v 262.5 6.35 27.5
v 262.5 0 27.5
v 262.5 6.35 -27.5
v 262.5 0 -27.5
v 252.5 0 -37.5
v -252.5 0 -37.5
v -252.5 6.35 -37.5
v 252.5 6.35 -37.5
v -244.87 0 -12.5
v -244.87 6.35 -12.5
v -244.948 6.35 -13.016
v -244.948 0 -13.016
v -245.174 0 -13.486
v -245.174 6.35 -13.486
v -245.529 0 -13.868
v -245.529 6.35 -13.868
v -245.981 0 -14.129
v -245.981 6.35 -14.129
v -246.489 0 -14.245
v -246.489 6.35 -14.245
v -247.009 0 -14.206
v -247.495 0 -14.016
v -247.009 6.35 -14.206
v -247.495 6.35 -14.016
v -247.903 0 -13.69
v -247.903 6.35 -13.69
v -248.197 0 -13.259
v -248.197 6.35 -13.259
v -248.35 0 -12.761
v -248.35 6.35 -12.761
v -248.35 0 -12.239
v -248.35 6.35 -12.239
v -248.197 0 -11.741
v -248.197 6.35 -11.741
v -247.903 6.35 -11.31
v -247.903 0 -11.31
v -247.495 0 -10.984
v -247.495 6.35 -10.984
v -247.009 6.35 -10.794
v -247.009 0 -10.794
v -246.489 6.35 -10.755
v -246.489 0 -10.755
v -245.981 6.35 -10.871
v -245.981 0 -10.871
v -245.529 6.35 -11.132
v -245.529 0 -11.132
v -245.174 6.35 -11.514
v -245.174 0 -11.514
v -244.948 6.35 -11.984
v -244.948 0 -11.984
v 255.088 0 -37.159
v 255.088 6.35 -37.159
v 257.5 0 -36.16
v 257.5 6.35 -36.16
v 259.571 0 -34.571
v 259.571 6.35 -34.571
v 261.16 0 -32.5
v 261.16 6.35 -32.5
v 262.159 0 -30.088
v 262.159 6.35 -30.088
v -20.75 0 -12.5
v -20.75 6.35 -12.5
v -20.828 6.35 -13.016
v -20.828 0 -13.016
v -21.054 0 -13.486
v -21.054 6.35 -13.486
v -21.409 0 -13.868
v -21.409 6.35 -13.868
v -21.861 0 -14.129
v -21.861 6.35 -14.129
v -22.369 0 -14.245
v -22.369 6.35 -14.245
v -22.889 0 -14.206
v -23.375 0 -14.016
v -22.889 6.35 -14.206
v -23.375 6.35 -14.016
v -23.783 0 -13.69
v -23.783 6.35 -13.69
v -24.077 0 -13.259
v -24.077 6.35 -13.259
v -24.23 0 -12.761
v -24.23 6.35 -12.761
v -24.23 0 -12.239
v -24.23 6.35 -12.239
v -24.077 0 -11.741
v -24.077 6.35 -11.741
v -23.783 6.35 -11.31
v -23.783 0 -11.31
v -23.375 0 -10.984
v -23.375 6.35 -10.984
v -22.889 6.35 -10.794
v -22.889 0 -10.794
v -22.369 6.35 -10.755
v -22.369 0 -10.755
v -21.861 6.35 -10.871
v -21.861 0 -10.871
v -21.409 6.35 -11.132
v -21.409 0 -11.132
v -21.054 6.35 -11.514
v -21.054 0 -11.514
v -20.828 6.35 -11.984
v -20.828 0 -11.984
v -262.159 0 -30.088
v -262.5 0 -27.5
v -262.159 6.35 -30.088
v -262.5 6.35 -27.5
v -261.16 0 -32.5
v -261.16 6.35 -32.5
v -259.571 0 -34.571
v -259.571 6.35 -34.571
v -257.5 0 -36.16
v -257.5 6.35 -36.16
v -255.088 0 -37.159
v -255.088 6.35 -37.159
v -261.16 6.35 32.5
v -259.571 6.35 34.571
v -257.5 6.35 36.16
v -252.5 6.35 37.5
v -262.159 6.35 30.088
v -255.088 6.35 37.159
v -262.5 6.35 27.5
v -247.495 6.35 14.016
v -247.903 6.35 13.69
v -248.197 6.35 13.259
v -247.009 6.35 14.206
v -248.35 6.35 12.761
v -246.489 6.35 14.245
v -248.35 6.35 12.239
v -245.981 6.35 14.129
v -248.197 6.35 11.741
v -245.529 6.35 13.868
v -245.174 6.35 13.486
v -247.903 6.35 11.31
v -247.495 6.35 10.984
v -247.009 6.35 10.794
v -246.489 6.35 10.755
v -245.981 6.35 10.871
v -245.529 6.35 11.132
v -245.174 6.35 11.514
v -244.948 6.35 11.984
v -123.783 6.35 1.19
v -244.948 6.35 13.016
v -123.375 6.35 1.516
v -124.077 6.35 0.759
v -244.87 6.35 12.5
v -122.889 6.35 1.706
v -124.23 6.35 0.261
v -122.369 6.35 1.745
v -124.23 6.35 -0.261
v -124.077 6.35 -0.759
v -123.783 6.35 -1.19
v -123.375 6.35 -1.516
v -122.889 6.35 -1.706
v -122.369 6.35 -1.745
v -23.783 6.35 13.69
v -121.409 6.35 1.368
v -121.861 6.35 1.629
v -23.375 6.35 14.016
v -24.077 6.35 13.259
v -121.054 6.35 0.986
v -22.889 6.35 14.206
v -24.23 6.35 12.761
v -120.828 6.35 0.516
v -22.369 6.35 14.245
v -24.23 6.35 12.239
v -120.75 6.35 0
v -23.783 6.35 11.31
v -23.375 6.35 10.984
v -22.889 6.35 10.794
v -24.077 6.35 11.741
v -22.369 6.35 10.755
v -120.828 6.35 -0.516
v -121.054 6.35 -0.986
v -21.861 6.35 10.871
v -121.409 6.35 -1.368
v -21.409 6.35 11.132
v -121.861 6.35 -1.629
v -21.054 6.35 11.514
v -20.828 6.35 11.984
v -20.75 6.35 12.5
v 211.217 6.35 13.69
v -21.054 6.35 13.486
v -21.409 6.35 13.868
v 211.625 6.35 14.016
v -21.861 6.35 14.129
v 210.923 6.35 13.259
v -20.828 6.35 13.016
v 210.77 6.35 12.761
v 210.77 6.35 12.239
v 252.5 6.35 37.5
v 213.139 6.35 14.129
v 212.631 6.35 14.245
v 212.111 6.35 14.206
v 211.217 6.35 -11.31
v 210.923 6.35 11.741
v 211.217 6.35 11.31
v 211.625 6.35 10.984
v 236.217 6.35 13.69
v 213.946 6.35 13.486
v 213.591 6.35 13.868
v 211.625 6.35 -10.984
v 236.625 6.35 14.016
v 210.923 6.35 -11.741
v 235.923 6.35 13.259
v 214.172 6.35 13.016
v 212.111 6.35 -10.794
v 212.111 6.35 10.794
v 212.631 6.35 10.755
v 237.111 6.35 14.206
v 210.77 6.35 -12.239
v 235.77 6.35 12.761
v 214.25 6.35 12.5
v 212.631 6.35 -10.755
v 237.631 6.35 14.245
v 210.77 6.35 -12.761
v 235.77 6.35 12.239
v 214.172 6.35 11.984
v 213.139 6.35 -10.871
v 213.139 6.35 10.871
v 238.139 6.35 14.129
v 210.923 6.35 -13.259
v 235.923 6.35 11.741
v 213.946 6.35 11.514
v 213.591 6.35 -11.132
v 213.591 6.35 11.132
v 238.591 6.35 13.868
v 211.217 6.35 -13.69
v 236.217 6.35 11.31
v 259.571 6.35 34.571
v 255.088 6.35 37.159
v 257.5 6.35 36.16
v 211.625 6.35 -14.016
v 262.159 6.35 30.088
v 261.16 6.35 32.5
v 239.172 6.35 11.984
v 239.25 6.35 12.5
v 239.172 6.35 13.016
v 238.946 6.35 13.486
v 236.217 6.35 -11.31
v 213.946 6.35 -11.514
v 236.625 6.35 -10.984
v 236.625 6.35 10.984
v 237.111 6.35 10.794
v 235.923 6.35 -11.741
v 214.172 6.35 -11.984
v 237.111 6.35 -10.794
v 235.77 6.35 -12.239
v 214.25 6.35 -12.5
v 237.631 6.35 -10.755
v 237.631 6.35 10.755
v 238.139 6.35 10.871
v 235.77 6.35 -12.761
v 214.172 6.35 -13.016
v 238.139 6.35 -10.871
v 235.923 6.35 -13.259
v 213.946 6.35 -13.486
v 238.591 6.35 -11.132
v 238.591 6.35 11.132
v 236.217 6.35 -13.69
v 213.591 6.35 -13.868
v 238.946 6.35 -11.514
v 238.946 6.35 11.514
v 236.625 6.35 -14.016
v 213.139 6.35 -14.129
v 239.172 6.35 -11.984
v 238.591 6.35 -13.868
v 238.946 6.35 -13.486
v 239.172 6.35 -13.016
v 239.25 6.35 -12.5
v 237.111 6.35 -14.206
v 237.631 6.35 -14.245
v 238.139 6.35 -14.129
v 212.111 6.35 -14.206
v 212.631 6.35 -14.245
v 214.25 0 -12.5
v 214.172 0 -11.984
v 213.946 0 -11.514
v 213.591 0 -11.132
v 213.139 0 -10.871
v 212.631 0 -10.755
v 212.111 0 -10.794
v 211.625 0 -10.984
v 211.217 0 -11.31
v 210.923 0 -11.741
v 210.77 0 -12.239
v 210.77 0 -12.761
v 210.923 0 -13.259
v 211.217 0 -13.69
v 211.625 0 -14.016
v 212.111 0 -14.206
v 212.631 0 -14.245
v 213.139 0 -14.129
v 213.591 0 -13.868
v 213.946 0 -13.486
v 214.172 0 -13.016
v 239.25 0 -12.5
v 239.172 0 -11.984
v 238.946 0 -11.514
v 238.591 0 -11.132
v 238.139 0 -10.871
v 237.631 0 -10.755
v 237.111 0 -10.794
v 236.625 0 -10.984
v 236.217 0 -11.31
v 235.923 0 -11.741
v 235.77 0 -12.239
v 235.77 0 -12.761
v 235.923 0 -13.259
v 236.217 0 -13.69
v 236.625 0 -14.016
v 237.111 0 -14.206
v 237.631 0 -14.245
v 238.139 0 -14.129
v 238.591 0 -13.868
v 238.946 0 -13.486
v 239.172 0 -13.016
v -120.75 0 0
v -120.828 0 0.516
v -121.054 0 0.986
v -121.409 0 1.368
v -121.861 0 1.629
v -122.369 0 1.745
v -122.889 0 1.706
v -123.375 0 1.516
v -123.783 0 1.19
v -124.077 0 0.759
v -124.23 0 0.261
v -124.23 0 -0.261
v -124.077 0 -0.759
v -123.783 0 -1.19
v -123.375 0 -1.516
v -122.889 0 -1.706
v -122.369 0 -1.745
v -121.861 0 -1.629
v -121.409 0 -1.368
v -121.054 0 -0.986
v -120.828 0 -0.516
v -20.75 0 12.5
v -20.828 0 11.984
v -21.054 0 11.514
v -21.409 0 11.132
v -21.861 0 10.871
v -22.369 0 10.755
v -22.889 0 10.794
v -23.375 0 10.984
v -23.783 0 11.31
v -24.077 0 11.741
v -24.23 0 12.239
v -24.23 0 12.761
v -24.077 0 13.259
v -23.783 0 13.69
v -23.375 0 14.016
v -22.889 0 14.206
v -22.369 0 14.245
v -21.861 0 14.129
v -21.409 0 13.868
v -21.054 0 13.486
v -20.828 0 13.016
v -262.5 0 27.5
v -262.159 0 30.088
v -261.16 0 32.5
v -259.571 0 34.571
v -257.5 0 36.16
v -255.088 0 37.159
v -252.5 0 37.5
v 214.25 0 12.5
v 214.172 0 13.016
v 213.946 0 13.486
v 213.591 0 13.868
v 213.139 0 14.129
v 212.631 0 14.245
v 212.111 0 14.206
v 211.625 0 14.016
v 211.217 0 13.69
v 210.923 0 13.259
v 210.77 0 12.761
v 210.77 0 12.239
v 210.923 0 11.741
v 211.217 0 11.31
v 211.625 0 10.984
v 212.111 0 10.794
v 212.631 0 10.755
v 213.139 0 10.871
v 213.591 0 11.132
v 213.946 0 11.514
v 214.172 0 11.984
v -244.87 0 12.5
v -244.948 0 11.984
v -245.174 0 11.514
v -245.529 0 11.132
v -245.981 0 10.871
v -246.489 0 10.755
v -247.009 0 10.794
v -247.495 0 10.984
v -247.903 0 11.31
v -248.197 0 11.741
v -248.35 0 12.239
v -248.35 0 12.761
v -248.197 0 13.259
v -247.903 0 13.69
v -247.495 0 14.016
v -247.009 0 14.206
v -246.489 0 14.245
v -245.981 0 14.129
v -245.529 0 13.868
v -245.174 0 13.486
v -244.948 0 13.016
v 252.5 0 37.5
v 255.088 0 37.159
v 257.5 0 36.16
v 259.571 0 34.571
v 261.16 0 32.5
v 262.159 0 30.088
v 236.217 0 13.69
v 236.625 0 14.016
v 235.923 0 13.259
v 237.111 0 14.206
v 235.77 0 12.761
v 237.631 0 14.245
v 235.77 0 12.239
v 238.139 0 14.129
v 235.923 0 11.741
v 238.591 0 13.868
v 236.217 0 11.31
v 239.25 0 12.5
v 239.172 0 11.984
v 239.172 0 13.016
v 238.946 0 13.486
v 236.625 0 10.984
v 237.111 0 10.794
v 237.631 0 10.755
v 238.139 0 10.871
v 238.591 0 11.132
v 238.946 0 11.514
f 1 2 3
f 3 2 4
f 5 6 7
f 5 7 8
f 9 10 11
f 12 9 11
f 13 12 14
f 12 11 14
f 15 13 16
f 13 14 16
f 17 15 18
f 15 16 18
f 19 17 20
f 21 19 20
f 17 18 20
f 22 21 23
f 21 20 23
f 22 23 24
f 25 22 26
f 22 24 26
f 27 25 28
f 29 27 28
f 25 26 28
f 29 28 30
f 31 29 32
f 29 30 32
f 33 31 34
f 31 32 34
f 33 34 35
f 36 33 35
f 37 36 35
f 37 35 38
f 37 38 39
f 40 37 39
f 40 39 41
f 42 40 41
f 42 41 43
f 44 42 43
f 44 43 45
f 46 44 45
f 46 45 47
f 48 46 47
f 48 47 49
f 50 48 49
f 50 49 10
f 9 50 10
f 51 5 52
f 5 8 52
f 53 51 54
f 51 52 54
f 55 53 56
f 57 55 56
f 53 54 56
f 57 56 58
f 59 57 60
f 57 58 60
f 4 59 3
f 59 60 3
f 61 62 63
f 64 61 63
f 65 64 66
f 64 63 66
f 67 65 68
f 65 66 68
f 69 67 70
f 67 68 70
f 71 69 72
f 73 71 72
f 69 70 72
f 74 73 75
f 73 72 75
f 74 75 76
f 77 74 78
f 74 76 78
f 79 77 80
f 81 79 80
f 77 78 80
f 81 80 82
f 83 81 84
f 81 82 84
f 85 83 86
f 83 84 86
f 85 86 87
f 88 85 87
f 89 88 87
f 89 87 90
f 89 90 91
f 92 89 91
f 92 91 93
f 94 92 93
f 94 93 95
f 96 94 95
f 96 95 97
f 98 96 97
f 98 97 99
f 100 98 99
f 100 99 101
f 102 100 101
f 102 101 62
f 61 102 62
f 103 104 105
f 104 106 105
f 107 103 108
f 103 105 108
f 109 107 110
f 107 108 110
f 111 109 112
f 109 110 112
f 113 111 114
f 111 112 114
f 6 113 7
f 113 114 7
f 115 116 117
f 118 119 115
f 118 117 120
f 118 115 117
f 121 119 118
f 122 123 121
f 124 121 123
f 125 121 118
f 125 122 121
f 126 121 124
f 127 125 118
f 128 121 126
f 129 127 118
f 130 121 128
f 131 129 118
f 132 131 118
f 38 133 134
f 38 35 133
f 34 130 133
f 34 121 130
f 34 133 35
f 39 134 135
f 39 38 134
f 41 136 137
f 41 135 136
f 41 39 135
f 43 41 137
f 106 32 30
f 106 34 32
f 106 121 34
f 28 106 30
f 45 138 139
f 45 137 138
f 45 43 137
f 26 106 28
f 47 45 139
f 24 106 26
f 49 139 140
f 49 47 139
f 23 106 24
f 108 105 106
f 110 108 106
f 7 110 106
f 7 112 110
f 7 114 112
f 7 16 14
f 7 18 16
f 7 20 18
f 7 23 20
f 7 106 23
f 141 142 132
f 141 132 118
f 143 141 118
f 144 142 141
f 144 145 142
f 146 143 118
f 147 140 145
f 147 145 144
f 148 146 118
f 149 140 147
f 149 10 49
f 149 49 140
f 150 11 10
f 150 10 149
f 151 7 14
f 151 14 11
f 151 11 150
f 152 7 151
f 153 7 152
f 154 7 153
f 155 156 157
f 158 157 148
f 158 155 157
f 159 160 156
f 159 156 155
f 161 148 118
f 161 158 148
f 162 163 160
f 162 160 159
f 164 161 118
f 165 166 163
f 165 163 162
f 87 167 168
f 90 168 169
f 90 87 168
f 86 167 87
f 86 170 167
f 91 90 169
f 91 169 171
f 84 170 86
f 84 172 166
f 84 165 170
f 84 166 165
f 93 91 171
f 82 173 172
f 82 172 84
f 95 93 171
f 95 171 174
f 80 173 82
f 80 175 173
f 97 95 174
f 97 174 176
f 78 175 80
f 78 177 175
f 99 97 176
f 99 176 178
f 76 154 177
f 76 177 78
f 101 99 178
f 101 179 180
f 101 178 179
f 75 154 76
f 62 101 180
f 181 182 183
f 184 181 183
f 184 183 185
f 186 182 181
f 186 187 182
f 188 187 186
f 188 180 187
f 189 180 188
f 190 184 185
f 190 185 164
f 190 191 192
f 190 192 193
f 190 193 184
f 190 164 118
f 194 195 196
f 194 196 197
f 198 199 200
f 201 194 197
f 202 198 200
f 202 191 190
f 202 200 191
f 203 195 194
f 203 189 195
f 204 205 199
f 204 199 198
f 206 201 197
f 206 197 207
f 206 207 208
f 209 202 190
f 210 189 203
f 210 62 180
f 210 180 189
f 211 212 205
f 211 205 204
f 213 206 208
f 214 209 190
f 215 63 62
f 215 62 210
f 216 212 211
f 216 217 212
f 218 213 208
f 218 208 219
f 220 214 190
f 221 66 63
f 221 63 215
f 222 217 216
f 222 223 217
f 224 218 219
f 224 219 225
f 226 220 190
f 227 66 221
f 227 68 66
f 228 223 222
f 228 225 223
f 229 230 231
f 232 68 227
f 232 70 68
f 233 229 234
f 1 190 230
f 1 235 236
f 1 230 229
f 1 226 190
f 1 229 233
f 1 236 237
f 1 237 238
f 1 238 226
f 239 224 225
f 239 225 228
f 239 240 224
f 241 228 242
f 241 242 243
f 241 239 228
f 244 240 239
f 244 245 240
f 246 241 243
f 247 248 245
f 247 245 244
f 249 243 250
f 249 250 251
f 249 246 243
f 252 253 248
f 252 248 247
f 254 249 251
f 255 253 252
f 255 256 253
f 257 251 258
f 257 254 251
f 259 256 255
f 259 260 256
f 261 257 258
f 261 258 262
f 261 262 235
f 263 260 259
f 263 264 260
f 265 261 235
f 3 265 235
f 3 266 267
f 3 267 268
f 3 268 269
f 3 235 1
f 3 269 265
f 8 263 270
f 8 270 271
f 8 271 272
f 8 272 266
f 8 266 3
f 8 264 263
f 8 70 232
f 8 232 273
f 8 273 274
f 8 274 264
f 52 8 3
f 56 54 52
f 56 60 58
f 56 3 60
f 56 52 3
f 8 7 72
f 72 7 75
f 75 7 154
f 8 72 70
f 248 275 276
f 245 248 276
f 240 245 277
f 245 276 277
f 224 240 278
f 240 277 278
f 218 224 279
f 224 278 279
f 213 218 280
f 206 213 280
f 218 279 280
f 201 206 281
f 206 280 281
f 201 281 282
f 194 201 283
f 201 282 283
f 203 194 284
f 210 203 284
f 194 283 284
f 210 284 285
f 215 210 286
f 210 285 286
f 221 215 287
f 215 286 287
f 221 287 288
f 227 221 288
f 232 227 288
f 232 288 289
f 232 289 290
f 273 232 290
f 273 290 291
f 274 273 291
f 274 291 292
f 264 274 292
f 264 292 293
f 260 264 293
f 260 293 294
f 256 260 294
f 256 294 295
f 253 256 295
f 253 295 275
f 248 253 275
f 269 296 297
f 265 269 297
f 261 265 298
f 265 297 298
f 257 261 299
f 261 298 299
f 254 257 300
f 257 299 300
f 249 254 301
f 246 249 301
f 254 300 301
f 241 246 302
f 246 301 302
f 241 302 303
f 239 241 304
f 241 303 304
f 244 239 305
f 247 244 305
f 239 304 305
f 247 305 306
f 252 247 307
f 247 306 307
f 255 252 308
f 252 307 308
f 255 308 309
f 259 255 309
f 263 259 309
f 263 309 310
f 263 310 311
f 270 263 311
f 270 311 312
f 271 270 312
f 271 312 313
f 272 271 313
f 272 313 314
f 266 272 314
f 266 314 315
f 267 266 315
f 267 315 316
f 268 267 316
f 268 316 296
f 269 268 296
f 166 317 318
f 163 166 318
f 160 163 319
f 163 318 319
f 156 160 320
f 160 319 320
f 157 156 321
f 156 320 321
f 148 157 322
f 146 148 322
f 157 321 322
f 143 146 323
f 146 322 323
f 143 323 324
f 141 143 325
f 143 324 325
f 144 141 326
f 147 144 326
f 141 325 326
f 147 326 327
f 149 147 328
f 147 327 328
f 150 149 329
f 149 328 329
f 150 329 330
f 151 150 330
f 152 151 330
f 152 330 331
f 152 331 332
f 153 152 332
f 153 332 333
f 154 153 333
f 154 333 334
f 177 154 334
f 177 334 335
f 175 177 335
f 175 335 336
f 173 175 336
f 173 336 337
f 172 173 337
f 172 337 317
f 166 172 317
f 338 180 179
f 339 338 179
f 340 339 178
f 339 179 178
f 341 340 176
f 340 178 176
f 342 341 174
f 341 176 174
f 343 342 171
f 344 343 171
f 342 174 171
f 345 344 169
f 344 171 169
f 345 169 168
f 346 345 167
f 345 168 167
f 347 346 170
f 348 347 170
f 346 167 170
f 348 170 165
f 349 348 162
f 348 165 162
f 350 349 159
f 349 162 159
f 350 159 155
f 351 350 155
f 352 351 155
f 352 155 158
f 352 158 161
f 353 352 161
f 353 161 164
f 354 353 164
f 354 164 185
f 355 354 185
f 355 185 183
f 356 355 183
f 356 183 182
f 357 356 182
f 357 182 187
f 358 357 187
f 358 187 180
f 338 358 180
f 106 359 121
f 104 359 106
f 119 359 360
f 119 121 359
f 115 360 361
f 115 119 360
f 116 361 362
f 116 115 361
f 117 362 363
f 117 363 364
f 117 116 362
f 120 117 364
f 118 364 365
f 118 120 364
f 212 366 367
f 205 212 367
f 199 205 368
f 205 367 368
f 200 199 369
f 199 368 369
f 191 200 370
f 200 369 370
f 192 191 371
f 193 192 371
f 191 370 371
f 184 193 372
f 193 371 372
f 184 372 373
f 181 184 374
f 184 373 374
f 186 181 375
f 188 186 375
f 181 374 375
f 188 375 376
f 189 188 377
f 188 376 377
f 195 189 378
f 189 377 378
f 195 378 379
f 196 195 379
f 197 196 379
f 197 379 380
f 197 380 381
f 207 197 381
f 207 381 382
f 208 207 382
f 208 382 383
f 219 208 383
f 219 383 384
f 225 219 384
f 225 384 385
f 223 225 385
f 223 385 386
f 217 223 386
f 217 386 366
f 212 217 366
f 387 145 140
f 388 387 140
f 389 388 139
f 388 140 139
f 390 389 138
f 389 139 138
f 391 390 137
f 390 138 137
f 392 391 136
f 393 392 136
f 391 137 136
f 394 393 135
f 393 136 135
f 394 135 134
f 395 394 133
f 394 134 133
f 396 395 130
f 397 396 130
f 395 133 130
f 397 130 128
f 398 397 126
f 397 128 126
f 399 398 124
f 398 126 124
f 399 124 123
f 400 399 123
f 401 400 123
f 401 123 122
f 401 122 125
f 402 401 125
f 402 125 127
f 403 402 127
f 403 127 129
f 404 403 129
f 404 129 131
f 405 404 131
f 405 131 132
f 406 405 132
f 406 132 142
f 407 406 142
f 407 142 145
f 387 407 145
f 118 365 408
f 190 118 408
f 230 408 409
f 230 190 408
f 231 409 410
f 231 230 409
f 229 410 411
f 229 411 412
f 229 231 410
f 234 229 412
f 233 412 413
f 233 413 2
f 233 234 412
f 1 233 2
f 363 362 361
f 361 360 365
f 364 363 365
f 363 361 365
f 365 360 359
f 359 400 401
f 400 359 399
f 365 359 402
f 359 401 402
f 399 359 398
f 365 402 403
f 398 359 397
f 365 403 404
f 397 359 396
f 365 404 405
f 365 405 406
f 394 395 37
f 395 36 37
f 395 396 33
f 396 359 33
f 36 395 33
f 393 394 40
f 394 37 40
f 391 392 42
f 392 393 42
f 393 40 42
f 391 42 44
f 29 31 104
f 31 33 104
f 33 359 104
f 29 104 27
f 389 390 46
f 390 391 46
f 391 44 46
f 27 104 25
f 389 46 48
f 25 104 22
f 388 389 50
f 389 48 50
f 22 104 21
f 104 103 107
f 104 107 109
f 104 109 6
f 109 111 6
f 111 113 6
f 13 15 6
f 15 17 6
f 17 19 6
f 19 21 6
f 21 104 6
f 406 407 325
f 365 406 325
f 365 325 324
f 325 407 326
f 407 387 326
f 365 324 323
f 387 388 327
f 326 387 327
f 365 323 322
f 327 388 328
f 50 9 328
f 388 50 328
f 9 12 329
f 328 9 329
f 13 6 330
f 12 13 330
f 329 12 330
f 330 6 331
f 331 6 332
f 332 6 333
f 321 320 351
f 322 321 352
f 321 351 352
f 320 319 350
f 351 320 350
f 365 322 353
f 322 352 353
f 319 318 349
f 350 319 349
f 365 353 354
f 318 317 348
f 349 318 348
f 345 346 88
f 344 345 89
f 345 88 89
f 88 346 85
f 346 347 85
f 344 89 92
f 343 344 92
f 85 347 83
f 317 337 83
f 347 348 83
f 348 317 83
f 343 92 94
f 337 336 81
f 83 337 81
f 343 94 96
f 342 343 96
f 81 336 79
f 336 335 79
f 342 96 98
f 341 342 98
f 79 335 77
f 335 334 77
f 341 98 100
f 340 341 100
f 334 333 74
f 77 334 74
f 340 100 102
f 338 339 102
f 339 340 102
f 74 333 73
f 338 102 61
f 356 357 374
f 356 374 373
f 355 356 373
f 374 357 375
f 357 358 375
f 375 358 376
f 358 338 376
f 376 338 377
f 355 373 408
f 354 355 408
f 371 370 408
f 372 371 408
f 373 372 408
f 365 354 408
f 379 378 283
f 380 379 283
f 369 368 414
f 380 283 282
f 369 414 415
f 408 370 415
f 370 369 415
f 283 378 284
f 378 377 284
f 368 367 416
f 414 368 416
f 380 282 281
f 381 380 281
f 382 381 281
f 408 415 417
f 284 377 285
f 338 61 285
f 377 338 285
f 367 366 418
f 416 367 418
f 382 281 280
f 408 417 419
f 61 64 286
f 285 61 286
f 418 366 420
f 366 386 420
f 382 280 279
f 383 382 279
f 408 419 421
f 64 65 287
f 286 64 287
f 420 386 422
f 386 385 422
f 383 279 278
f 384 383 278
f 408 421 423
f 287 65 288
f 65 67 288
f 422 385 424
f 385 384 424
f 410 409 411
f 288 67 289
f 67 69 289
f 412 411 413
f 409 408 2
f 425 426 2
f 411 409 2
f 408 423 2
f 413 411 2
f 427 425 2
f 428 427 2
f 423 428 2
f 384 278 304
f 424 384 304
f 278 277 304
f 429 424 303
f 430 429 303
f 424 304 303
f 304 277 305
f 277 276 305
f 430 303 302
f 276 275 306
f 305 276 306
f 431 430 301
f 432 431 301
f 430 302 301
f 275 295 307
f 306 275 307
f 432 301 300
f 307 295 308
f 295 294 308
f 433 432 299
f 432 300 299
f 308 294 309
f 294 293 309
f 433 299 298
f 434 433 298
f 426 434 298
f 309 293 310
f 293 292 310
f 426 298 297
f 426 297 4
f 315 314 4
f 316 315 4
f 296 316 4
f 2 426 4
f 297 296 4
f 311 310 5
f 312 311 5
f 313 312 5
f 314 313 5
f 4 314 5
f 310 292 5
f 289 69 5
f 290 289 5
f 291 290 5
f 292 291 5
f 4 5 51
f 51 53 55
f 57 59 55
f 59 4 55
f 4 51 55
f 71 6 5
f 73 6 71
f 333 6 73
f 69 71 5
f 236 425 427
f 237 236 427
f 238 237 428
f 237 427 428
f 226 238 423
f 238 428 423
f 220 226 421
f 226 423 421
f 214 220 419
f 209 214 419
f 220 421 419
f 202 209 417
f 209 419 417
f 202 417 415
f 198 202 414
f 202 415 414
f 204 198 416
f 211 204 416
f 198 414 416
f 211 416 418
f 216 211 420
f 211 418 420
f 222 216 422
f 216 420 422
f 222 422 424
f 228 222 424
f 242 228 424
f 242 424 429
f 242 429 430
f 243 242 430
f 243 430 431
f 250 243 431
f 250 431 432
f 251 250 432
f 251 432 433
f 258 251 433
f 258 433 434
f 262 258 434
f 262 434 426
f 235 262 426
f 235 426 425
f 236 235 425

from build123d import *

# Parameters (mm, degrees)
SKETCH12_W                = 525
SKETCH12_H                = 75
BOSS_EXTRUDE2_DEPTH       = 6.35
SKETCH13_R                = 1.75
CUT_EXTRUDE1_DEPTH        = 7.35
LPATTERN1_COUNT           = 2
LPATTERN1_PITCH           = 25
LPATTERN2_COUNT           = 2
LPATTERN2_PITCH           = 25
LPATTERN2_COPY_1_SKETCH_R = 1.75
LPATTERN2_COPY_1_DEPTH    = 7.35
SKETCH15_R                = 1.75
CUT_EXTRUDE2_DEPTH        = 7.35
FILLET1_R                 = 10
SKETCH17_R                = 1.75
CUT_EXTRUDE3_DEPTH        = 7.35
SKETCH18_R                = 1.75
CUT_EXTRUDE4_DEPTH        = 7.35


with BuildPart() as part:
    # Sketch12 → Boss-Extrude2 (new body)
    with BuildSketch(Plane(origin=(0, 0, 0), x_dir=(1, 0, 0), z_dir=(0, 1, 0))):
        Rectangle(SKETCH12_W, SKETCH12_H)
    extrude(amount=BOSS_EXTRUDE2_DEPTH)

    # Sketch13 → Cut-Extrude1 (cut, through all)
    with BuildSketch(Plane.XZ):
        with Locations((212.5, -12.5)):
            Circle(SKETCH13_R)
    cut_extrude1 = extrude(amount=-CUT_EXTRUDE1_DEPTH, mode=Mode.SUBTRACT)

    # LPattern1: Cut-Extrude1 ×2
    with Locations(*[(i * LPATTERN1_PITCH, 0, 0) for i in range(1, LPATTERN1_COUNT)]):
        add(cut_extrude1, mode=Mode.SUBTRACT)

    # LPattern2: Cut-Extrude1 ×2
    with Locations(*[(0, 0, i * LPATTERN2_PITCH) for i in range(1, LPATTERN2_COUNT)]):
        add(cut_extrude1, mode=Mode.SUBTRACT)

    # LPattern2 copy 1 sketch → LPattern2 copy 1 (cut, through all)
    with BuildSketch(Plane(origin=(25, 0, 25), x_dir=(1, 0, 0), z_dir=(0, -1, 0))):
        with Locations((212.5, -12.5)):
            Circle(LPATTERN2_COPY_1_SKETCH_R)
    extrude(amount=-LPATTERN2_COPY_1_DEPTH, mode=Mode.SUBTRACT)

    # Sketch15 → Cut-Extrude2 (cut, through all)
    with BuildSketch(Plane.XZ):
        with Locations((-122.5, 0)):
            Circle(SKETCH15_R)
    extrude(amount=-CUT_EXTRUDE2_DEPTH, mode=Mode.SUBTRACT)

    # Fillet1
    fillet1_edges = [part.edges().sort_by_distance(p)[0] for p in [
        (262.5, 3.175, 37.5),
        (-262.5, 3.175, 37.5),
        (-262.5, 3.175, -37.5),
        (262.5, 3.175, -37.5),
    ]]
    fillet(fillet1_edges, radius=FILLET1_R)

    # Sketch17 → Cut-Extrude3 (cut, through all)
    with BuildSketch(Plane(origin=(0, 6.35, 0), x_dir=(1, 0, 0), z_dir=(0, 1, 0))):
        with Locations((-22.5, 12.5)):
            Circle(SKETCH17_R)
        with Locations((-22.5, -12.5)):
            Circle(SKETCH17_R)
    extrude(amount=-CUT_EXTRUDE3_DEPTH, mode=Mode.SUBTRACT)

    # Sketch18 → Cut-Extrude4 (cut, through all)
    with BuildSketch(Plane(origin=(0, 6.35, 0), x_dir=(1, 0, 0), z_dir=(0, 1, 0))):
        with Locations((-246.62, 12.5)):
            Circle(SKETCH18_R)
        with Locations((-246.62, -12.5)):
            Circle(SKETCH18_R)
    extrude(amount=-CUT_EXTRUDE4_DEPTH, mode=Mode.SUBTRACT)


solid = part.part
